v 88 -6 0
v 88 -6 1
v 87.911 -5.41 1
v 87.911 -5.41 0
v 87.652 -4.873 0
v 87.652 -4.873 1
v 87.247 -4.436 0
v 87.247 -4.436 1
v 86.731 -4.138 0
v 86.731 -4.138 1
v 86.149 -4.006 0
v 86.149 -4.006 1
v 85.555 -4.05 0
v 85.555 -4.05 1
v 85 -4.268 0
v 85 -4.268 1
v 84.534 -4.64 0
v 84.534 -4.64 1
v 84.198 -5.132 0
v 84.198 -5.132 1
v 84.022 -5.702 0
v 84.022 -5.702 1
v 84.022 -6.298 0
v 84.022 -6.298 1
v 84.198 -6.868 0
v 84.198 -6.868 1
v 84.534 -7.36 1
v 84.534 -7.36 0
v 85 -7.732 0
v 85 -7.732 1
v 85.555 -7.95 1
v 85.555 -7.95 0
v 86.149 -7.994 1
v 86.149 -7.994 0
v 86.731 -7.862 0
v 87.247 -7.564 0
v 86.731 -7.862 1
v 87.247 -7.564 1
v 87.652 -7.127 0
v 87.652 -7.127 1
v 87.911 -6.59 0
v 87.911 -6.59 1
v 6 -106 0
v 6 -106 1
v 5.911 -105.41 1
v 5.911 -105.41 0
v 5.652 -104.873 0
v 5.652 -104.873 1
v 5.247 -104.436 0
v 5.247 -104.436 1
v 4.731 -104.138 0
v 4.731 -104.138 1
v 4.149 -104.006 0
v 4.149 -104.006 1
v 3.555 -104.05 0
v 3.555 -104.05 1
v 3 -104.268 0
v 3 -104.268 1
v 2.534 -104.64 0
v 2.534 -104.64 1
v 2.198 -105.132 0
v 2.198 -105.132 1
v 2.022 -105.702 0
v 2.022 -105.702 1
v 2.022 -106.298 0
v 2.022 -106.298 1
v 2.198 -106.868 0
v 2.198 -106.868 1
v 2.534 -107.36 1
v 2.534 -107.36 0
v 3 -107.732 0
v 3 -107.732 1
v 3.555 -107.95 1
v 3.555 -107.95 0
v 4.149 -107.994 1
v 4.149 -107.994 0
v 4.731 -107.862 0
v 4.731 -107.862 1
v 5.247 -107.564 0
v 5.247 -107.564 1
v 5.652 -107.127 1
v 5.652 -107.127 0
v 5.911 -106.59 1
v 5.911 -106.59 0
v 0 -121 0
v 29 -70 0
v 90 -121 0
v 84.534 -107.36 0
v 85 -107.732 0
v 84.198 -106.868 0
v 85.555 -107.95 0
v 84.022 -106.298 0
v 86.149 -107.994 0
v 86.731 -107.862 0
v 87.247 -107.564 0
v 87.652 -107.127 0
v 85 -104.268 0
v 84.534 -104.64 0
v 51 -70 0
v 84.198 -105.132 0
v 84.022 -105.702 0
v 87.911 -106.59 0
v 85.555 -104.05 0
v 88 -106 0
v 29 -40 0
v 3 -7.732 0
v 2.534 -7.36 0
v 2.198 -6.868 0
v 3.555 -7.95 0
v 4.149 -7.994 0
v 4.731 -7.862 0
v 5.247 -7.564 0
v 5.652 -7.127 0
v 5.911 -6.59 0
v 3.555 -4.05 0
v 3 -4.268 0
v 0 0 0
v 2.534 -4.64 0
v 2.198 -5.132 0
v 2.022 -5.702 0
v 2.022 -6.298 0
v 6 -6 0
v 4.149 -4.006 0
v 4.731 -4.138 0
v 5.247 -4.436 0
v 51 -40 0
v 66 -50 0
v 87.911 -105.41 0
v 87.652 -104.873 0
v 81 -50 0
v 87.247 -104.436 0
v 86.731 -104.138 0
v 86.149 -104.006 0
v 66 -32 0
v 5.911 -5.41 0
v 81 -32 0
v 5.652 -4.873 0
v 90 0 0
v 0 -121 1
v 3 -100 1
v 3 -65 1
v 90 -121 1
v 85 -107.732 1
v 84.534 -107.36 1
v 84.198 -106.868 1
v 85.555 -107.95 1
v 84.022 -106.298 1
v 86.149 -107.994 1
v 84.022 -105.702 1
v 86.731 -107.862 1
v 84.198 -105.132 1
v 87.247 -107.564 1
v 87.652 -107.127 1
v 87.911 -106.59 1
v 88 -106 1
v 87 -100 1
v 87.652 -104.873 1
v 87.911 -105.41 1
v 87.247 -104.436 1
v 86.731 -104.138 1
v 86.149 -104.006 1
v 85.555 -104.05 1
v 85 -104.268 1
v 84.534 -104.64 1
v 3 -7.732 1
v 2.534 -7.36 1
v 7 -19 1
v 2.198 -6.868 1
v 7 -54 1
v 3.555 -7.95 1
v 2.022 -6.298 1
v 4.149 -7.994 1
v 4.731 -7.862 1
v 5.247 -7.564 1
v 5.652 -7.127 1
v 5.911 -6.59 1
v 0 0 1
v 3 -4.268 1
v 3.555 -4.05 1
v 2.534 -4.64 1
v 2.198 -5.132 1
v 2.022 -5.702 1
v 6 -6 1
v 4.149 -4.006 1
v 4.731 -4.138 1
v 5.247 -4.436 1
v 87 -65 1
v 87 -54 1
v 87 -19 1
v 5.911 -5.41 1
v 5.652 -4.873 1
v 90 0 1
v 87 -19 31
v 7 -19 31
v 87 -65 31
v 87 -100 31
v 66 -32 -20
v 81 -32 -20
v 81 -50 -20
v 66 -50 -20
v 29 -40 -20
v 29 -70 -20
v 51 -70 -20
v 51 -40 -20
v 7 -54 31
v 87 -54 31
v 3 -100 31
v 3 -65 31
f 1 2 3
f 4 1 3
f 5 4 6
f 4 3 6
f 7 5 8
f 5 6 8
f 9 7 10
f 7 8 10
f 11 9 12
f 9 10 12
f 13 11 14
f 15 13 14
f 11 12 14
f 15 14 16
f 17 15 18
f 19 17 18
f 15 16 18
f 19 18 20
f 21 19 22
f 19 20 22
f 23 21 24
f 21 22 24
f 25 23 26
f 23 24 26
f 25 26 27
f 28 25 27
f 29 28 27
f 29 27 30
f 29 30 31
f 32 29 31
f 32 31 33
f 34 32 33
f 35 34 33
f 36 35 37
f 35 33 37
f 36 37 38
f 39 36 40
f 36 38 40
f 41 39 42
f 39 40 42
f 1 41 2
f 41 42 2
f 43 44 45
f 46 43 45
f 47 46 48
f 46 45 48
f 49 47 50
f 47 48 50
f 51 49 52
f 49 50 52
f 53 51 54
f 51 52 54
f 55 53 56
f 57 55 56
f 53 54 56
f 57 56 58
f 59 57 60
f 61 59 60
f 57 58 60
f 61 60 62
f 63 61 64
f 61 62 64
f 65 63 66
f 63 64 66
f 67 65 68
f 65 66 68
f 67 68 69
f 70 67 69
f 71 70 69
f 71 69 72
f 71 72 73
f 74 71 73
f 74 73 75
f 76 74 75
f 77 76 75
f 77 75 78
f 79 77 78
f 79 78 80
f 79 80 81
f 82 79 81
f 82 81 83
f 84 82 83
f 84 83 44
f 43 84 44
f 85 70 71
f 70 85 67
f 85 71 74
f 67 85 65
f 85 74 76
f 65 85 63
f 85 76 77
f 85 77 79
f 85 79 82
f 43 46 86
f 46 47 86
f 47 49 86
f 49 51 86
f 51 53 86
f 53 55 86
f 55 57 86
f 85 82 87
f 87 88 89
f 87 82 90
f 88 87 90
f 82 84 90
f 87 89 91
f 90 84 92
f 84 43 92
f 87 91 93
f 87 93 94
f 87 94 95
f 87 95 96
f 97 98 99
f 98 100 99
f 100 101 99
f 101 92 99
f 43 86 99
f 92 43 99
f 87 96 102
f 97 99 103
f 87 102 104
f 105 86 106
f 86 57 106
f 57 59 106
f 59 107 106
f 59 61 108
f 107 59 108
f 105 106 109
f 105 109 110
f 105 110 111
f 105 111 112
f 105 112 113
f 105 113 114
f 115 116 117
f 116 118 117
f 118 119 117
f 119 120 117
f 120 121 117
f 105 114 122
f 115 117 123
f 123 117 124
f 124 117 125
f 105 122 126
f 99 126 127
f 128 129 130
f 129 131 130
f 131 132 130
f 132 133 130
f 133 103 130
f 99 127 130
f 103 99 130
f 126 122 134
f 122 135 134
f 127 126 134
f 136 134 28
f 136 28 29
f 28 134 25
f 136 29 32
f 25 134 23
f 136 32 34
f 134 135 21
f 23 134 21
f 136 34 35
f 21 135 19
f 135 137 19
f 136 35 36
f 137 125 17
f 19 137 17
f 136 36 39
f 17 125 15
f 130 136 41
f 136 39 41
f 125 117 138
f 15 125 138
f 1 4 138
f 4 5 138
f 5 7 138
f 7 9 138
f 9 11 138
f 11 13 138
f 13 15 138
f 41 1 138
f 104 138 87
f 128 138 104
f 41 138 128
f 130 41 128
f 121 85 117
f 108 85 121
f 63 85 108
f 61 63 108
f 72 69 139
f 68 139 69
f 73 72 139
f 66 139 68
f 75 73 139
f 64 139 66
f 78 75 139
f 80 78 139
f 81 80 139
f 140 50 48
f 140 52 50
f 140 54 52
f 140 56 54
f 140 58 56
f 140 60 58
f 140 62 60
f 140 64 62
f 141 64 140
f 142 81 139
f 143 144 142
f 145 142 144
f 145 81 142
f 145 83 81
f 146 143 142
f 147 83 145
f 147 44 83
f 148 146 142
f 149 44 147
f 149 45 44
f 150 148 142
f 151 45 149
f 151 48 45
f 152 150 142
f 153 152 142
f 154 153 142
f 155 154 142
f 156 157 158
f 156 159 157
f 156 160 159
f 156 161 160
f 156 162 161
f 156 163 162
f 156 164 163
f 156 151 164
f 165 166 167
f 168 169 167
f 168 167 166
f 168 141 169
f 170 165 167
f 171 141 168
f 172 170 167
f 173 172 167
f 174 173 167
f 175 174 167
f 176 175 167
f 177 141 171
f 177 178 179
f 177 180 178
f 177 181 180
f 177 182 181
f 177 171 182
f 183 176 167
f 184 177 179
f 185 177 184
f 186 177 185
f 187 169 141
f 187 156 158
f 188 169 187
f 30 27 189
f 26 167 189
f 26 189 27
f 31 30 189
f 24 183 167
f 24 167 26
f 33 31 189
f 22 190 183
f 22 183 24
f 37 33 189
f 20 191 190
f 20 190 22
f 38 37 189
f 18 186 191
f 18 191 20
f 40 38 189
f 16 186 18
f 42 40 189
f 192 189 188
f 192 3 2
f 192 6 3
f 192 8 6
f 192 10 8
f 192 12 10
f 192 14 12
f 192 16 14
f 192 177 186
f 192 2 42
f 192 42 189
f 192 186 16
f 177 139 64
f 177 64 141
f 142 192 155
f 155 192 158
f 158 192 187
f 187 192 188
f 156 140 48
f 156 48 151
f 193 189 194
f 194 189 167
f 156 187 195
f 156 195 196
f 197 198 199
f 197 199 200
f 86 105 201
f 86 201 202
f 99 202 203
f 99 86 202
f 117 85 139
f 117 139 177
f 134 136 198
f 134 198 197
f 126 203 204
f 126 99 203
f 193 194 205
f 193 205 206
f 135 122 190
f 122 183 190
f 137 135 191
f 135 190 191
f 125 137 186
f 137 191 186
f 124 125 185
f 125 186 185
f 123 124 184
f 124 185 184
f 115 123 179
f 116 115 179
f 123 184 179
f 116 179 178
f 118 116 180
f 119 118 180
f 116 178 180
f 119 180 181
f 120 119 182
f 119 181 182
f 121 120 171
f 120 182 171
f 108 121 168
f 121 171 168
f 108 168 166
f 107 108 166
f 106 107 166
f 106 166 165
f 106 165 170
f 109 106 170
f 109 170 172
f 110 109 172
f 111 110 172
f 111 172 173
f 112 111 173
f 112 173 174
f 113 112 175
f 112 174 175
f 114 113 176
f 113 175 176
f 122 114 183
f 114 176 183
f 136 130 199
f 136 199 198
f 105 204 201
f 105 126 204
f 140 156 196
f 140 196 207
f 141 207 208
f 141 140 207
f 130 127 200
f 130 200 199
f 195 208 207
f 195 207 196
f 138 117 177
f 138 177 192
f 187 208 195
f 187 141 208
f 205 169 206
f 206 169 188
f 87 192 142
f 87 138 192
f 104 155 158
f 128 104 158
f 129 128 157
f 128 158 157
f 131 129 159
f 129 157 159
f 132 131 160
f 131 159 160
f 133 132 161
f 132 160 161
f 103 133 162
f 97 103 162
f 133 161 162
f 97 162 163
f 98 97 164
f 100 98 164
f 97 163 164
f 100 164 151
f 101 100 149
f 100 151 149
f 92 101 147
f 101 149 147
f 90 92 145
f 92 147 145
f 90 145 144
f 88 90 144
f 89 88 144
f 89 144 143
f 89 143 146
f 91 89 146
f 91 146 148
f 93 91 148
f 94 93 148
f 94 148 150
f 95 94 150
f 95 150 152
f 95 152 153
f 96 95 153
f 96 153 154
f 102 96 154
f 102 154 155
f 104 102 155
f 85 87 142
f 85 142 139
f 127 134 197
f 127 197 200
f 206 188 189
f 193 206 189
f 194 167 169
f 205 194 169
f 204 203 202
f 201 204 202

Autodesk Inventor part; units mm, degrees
ref_plane "YZ Plane" through (0, 0, 0) normal (1, 0, 0) x (0, 1, 0)
ref_plane "XZ Plane" through (0, 0, 0) normal (0, 1, 0) x (-1, 0, 0)
ref_plane "XY Plane" through (0, 0, 0) normal (0, 0, 1) x (1, 0, 0)
sketch "Schizzo1" plane through (0, 0, 0) normal (0, 0, 1) x (1, 0, 0)
  line L0 (0, 0) -> (90, 0)
  line L1 (90, 0) -> (90, -121)
  line L2 (90, -121) -> (0, -121)
  line L3 (0, -121) -> (0, 0)
  dimension "d0" = 90
  dimension "d1" = 121
extrude "Estrusione1" add sketch "Schizzo1" along normal blind 1
sketch "Schizzo2" plane through (0, 0, 0) normal (0, 0, -1) x (-1, 0, 0)
  line L0 (-90, 0) -> (-90, -32)
  line L1 (-90, -121) -> (-90, 0) projected
  line L2 (-81, -32) -> (-66, -32)
  line L3 (-66, -32) -> (-66, -50)
  line L4 (-66, -50) -> (-81, -50)
  line L5 (-81, -50) -> (-81, -32)
  line L6 (-90, 0) -> (-90, -40)
  line L7 (-51, -40) -> (-29, -40)
  line L8 (-29, -40) -> (-29, -70)
  line L9 (-29, -70) -> (-51, -70)
  line L10 (-51, -70) -> (-51, -40)
  dimension "d10" = 22
  dimension "d11" = 30
extrude "Estrusione2" add sketch "Schizzo2" along normal blind 20
sketch "Schizzo3" plane through (0, 0, 1) normal (0, 0, 1) x (1, 0, 0)
  line L0 (90, -121) -> (90, 0) projected
  line L1 (90, 0) -> (90, -19)
  line L2 (87, -19) -> (7, -19)
  line L3 (7, -19) -> (7, -54)
  line L4 (7, -54) -> (87, -54)
  line L5 (87, -54) -> (87, -19)
  line L6 (90, -121) -> (90, -100)
  line L7 (87, -100) -> (3, -100)
  line L8 (3, -100) -> (3, -65)
  line L9 (3, -65) -> (87, -65)
  line L10 (87, -65) -> (87, -100)
  dimension "d16" = 80
  dimension "d17" = 35
  dimension "d19" = 84
  dimension "d20" = 35
extrude "Estrusione3" add sketch "Schizzo3" along normal blind 30
sketch "Schizzo4" plane through (0, 0, 1) normal (0, 0, 1) x (1, 0, 0)
  line L0 (90, -121) -> (90, 0) projected
  line L1 (90, 0) -> (90, -6)
  circle A0 centre (86, -6) radius 2
  circle A1 centre (4, -6) radius 2
  circle A2 centre (86, -106) radius 2
  circle A3 centre (4, -106) radius 2
  dimension "d28" = 4
  dimension "d32" = 4
  dimension "d33" = 4
extrude "Estrusione4" cut sketch "Schizzo4" against normal up to surface (1 mm away)
properties part number "pcb" material "Plastica ABS"
